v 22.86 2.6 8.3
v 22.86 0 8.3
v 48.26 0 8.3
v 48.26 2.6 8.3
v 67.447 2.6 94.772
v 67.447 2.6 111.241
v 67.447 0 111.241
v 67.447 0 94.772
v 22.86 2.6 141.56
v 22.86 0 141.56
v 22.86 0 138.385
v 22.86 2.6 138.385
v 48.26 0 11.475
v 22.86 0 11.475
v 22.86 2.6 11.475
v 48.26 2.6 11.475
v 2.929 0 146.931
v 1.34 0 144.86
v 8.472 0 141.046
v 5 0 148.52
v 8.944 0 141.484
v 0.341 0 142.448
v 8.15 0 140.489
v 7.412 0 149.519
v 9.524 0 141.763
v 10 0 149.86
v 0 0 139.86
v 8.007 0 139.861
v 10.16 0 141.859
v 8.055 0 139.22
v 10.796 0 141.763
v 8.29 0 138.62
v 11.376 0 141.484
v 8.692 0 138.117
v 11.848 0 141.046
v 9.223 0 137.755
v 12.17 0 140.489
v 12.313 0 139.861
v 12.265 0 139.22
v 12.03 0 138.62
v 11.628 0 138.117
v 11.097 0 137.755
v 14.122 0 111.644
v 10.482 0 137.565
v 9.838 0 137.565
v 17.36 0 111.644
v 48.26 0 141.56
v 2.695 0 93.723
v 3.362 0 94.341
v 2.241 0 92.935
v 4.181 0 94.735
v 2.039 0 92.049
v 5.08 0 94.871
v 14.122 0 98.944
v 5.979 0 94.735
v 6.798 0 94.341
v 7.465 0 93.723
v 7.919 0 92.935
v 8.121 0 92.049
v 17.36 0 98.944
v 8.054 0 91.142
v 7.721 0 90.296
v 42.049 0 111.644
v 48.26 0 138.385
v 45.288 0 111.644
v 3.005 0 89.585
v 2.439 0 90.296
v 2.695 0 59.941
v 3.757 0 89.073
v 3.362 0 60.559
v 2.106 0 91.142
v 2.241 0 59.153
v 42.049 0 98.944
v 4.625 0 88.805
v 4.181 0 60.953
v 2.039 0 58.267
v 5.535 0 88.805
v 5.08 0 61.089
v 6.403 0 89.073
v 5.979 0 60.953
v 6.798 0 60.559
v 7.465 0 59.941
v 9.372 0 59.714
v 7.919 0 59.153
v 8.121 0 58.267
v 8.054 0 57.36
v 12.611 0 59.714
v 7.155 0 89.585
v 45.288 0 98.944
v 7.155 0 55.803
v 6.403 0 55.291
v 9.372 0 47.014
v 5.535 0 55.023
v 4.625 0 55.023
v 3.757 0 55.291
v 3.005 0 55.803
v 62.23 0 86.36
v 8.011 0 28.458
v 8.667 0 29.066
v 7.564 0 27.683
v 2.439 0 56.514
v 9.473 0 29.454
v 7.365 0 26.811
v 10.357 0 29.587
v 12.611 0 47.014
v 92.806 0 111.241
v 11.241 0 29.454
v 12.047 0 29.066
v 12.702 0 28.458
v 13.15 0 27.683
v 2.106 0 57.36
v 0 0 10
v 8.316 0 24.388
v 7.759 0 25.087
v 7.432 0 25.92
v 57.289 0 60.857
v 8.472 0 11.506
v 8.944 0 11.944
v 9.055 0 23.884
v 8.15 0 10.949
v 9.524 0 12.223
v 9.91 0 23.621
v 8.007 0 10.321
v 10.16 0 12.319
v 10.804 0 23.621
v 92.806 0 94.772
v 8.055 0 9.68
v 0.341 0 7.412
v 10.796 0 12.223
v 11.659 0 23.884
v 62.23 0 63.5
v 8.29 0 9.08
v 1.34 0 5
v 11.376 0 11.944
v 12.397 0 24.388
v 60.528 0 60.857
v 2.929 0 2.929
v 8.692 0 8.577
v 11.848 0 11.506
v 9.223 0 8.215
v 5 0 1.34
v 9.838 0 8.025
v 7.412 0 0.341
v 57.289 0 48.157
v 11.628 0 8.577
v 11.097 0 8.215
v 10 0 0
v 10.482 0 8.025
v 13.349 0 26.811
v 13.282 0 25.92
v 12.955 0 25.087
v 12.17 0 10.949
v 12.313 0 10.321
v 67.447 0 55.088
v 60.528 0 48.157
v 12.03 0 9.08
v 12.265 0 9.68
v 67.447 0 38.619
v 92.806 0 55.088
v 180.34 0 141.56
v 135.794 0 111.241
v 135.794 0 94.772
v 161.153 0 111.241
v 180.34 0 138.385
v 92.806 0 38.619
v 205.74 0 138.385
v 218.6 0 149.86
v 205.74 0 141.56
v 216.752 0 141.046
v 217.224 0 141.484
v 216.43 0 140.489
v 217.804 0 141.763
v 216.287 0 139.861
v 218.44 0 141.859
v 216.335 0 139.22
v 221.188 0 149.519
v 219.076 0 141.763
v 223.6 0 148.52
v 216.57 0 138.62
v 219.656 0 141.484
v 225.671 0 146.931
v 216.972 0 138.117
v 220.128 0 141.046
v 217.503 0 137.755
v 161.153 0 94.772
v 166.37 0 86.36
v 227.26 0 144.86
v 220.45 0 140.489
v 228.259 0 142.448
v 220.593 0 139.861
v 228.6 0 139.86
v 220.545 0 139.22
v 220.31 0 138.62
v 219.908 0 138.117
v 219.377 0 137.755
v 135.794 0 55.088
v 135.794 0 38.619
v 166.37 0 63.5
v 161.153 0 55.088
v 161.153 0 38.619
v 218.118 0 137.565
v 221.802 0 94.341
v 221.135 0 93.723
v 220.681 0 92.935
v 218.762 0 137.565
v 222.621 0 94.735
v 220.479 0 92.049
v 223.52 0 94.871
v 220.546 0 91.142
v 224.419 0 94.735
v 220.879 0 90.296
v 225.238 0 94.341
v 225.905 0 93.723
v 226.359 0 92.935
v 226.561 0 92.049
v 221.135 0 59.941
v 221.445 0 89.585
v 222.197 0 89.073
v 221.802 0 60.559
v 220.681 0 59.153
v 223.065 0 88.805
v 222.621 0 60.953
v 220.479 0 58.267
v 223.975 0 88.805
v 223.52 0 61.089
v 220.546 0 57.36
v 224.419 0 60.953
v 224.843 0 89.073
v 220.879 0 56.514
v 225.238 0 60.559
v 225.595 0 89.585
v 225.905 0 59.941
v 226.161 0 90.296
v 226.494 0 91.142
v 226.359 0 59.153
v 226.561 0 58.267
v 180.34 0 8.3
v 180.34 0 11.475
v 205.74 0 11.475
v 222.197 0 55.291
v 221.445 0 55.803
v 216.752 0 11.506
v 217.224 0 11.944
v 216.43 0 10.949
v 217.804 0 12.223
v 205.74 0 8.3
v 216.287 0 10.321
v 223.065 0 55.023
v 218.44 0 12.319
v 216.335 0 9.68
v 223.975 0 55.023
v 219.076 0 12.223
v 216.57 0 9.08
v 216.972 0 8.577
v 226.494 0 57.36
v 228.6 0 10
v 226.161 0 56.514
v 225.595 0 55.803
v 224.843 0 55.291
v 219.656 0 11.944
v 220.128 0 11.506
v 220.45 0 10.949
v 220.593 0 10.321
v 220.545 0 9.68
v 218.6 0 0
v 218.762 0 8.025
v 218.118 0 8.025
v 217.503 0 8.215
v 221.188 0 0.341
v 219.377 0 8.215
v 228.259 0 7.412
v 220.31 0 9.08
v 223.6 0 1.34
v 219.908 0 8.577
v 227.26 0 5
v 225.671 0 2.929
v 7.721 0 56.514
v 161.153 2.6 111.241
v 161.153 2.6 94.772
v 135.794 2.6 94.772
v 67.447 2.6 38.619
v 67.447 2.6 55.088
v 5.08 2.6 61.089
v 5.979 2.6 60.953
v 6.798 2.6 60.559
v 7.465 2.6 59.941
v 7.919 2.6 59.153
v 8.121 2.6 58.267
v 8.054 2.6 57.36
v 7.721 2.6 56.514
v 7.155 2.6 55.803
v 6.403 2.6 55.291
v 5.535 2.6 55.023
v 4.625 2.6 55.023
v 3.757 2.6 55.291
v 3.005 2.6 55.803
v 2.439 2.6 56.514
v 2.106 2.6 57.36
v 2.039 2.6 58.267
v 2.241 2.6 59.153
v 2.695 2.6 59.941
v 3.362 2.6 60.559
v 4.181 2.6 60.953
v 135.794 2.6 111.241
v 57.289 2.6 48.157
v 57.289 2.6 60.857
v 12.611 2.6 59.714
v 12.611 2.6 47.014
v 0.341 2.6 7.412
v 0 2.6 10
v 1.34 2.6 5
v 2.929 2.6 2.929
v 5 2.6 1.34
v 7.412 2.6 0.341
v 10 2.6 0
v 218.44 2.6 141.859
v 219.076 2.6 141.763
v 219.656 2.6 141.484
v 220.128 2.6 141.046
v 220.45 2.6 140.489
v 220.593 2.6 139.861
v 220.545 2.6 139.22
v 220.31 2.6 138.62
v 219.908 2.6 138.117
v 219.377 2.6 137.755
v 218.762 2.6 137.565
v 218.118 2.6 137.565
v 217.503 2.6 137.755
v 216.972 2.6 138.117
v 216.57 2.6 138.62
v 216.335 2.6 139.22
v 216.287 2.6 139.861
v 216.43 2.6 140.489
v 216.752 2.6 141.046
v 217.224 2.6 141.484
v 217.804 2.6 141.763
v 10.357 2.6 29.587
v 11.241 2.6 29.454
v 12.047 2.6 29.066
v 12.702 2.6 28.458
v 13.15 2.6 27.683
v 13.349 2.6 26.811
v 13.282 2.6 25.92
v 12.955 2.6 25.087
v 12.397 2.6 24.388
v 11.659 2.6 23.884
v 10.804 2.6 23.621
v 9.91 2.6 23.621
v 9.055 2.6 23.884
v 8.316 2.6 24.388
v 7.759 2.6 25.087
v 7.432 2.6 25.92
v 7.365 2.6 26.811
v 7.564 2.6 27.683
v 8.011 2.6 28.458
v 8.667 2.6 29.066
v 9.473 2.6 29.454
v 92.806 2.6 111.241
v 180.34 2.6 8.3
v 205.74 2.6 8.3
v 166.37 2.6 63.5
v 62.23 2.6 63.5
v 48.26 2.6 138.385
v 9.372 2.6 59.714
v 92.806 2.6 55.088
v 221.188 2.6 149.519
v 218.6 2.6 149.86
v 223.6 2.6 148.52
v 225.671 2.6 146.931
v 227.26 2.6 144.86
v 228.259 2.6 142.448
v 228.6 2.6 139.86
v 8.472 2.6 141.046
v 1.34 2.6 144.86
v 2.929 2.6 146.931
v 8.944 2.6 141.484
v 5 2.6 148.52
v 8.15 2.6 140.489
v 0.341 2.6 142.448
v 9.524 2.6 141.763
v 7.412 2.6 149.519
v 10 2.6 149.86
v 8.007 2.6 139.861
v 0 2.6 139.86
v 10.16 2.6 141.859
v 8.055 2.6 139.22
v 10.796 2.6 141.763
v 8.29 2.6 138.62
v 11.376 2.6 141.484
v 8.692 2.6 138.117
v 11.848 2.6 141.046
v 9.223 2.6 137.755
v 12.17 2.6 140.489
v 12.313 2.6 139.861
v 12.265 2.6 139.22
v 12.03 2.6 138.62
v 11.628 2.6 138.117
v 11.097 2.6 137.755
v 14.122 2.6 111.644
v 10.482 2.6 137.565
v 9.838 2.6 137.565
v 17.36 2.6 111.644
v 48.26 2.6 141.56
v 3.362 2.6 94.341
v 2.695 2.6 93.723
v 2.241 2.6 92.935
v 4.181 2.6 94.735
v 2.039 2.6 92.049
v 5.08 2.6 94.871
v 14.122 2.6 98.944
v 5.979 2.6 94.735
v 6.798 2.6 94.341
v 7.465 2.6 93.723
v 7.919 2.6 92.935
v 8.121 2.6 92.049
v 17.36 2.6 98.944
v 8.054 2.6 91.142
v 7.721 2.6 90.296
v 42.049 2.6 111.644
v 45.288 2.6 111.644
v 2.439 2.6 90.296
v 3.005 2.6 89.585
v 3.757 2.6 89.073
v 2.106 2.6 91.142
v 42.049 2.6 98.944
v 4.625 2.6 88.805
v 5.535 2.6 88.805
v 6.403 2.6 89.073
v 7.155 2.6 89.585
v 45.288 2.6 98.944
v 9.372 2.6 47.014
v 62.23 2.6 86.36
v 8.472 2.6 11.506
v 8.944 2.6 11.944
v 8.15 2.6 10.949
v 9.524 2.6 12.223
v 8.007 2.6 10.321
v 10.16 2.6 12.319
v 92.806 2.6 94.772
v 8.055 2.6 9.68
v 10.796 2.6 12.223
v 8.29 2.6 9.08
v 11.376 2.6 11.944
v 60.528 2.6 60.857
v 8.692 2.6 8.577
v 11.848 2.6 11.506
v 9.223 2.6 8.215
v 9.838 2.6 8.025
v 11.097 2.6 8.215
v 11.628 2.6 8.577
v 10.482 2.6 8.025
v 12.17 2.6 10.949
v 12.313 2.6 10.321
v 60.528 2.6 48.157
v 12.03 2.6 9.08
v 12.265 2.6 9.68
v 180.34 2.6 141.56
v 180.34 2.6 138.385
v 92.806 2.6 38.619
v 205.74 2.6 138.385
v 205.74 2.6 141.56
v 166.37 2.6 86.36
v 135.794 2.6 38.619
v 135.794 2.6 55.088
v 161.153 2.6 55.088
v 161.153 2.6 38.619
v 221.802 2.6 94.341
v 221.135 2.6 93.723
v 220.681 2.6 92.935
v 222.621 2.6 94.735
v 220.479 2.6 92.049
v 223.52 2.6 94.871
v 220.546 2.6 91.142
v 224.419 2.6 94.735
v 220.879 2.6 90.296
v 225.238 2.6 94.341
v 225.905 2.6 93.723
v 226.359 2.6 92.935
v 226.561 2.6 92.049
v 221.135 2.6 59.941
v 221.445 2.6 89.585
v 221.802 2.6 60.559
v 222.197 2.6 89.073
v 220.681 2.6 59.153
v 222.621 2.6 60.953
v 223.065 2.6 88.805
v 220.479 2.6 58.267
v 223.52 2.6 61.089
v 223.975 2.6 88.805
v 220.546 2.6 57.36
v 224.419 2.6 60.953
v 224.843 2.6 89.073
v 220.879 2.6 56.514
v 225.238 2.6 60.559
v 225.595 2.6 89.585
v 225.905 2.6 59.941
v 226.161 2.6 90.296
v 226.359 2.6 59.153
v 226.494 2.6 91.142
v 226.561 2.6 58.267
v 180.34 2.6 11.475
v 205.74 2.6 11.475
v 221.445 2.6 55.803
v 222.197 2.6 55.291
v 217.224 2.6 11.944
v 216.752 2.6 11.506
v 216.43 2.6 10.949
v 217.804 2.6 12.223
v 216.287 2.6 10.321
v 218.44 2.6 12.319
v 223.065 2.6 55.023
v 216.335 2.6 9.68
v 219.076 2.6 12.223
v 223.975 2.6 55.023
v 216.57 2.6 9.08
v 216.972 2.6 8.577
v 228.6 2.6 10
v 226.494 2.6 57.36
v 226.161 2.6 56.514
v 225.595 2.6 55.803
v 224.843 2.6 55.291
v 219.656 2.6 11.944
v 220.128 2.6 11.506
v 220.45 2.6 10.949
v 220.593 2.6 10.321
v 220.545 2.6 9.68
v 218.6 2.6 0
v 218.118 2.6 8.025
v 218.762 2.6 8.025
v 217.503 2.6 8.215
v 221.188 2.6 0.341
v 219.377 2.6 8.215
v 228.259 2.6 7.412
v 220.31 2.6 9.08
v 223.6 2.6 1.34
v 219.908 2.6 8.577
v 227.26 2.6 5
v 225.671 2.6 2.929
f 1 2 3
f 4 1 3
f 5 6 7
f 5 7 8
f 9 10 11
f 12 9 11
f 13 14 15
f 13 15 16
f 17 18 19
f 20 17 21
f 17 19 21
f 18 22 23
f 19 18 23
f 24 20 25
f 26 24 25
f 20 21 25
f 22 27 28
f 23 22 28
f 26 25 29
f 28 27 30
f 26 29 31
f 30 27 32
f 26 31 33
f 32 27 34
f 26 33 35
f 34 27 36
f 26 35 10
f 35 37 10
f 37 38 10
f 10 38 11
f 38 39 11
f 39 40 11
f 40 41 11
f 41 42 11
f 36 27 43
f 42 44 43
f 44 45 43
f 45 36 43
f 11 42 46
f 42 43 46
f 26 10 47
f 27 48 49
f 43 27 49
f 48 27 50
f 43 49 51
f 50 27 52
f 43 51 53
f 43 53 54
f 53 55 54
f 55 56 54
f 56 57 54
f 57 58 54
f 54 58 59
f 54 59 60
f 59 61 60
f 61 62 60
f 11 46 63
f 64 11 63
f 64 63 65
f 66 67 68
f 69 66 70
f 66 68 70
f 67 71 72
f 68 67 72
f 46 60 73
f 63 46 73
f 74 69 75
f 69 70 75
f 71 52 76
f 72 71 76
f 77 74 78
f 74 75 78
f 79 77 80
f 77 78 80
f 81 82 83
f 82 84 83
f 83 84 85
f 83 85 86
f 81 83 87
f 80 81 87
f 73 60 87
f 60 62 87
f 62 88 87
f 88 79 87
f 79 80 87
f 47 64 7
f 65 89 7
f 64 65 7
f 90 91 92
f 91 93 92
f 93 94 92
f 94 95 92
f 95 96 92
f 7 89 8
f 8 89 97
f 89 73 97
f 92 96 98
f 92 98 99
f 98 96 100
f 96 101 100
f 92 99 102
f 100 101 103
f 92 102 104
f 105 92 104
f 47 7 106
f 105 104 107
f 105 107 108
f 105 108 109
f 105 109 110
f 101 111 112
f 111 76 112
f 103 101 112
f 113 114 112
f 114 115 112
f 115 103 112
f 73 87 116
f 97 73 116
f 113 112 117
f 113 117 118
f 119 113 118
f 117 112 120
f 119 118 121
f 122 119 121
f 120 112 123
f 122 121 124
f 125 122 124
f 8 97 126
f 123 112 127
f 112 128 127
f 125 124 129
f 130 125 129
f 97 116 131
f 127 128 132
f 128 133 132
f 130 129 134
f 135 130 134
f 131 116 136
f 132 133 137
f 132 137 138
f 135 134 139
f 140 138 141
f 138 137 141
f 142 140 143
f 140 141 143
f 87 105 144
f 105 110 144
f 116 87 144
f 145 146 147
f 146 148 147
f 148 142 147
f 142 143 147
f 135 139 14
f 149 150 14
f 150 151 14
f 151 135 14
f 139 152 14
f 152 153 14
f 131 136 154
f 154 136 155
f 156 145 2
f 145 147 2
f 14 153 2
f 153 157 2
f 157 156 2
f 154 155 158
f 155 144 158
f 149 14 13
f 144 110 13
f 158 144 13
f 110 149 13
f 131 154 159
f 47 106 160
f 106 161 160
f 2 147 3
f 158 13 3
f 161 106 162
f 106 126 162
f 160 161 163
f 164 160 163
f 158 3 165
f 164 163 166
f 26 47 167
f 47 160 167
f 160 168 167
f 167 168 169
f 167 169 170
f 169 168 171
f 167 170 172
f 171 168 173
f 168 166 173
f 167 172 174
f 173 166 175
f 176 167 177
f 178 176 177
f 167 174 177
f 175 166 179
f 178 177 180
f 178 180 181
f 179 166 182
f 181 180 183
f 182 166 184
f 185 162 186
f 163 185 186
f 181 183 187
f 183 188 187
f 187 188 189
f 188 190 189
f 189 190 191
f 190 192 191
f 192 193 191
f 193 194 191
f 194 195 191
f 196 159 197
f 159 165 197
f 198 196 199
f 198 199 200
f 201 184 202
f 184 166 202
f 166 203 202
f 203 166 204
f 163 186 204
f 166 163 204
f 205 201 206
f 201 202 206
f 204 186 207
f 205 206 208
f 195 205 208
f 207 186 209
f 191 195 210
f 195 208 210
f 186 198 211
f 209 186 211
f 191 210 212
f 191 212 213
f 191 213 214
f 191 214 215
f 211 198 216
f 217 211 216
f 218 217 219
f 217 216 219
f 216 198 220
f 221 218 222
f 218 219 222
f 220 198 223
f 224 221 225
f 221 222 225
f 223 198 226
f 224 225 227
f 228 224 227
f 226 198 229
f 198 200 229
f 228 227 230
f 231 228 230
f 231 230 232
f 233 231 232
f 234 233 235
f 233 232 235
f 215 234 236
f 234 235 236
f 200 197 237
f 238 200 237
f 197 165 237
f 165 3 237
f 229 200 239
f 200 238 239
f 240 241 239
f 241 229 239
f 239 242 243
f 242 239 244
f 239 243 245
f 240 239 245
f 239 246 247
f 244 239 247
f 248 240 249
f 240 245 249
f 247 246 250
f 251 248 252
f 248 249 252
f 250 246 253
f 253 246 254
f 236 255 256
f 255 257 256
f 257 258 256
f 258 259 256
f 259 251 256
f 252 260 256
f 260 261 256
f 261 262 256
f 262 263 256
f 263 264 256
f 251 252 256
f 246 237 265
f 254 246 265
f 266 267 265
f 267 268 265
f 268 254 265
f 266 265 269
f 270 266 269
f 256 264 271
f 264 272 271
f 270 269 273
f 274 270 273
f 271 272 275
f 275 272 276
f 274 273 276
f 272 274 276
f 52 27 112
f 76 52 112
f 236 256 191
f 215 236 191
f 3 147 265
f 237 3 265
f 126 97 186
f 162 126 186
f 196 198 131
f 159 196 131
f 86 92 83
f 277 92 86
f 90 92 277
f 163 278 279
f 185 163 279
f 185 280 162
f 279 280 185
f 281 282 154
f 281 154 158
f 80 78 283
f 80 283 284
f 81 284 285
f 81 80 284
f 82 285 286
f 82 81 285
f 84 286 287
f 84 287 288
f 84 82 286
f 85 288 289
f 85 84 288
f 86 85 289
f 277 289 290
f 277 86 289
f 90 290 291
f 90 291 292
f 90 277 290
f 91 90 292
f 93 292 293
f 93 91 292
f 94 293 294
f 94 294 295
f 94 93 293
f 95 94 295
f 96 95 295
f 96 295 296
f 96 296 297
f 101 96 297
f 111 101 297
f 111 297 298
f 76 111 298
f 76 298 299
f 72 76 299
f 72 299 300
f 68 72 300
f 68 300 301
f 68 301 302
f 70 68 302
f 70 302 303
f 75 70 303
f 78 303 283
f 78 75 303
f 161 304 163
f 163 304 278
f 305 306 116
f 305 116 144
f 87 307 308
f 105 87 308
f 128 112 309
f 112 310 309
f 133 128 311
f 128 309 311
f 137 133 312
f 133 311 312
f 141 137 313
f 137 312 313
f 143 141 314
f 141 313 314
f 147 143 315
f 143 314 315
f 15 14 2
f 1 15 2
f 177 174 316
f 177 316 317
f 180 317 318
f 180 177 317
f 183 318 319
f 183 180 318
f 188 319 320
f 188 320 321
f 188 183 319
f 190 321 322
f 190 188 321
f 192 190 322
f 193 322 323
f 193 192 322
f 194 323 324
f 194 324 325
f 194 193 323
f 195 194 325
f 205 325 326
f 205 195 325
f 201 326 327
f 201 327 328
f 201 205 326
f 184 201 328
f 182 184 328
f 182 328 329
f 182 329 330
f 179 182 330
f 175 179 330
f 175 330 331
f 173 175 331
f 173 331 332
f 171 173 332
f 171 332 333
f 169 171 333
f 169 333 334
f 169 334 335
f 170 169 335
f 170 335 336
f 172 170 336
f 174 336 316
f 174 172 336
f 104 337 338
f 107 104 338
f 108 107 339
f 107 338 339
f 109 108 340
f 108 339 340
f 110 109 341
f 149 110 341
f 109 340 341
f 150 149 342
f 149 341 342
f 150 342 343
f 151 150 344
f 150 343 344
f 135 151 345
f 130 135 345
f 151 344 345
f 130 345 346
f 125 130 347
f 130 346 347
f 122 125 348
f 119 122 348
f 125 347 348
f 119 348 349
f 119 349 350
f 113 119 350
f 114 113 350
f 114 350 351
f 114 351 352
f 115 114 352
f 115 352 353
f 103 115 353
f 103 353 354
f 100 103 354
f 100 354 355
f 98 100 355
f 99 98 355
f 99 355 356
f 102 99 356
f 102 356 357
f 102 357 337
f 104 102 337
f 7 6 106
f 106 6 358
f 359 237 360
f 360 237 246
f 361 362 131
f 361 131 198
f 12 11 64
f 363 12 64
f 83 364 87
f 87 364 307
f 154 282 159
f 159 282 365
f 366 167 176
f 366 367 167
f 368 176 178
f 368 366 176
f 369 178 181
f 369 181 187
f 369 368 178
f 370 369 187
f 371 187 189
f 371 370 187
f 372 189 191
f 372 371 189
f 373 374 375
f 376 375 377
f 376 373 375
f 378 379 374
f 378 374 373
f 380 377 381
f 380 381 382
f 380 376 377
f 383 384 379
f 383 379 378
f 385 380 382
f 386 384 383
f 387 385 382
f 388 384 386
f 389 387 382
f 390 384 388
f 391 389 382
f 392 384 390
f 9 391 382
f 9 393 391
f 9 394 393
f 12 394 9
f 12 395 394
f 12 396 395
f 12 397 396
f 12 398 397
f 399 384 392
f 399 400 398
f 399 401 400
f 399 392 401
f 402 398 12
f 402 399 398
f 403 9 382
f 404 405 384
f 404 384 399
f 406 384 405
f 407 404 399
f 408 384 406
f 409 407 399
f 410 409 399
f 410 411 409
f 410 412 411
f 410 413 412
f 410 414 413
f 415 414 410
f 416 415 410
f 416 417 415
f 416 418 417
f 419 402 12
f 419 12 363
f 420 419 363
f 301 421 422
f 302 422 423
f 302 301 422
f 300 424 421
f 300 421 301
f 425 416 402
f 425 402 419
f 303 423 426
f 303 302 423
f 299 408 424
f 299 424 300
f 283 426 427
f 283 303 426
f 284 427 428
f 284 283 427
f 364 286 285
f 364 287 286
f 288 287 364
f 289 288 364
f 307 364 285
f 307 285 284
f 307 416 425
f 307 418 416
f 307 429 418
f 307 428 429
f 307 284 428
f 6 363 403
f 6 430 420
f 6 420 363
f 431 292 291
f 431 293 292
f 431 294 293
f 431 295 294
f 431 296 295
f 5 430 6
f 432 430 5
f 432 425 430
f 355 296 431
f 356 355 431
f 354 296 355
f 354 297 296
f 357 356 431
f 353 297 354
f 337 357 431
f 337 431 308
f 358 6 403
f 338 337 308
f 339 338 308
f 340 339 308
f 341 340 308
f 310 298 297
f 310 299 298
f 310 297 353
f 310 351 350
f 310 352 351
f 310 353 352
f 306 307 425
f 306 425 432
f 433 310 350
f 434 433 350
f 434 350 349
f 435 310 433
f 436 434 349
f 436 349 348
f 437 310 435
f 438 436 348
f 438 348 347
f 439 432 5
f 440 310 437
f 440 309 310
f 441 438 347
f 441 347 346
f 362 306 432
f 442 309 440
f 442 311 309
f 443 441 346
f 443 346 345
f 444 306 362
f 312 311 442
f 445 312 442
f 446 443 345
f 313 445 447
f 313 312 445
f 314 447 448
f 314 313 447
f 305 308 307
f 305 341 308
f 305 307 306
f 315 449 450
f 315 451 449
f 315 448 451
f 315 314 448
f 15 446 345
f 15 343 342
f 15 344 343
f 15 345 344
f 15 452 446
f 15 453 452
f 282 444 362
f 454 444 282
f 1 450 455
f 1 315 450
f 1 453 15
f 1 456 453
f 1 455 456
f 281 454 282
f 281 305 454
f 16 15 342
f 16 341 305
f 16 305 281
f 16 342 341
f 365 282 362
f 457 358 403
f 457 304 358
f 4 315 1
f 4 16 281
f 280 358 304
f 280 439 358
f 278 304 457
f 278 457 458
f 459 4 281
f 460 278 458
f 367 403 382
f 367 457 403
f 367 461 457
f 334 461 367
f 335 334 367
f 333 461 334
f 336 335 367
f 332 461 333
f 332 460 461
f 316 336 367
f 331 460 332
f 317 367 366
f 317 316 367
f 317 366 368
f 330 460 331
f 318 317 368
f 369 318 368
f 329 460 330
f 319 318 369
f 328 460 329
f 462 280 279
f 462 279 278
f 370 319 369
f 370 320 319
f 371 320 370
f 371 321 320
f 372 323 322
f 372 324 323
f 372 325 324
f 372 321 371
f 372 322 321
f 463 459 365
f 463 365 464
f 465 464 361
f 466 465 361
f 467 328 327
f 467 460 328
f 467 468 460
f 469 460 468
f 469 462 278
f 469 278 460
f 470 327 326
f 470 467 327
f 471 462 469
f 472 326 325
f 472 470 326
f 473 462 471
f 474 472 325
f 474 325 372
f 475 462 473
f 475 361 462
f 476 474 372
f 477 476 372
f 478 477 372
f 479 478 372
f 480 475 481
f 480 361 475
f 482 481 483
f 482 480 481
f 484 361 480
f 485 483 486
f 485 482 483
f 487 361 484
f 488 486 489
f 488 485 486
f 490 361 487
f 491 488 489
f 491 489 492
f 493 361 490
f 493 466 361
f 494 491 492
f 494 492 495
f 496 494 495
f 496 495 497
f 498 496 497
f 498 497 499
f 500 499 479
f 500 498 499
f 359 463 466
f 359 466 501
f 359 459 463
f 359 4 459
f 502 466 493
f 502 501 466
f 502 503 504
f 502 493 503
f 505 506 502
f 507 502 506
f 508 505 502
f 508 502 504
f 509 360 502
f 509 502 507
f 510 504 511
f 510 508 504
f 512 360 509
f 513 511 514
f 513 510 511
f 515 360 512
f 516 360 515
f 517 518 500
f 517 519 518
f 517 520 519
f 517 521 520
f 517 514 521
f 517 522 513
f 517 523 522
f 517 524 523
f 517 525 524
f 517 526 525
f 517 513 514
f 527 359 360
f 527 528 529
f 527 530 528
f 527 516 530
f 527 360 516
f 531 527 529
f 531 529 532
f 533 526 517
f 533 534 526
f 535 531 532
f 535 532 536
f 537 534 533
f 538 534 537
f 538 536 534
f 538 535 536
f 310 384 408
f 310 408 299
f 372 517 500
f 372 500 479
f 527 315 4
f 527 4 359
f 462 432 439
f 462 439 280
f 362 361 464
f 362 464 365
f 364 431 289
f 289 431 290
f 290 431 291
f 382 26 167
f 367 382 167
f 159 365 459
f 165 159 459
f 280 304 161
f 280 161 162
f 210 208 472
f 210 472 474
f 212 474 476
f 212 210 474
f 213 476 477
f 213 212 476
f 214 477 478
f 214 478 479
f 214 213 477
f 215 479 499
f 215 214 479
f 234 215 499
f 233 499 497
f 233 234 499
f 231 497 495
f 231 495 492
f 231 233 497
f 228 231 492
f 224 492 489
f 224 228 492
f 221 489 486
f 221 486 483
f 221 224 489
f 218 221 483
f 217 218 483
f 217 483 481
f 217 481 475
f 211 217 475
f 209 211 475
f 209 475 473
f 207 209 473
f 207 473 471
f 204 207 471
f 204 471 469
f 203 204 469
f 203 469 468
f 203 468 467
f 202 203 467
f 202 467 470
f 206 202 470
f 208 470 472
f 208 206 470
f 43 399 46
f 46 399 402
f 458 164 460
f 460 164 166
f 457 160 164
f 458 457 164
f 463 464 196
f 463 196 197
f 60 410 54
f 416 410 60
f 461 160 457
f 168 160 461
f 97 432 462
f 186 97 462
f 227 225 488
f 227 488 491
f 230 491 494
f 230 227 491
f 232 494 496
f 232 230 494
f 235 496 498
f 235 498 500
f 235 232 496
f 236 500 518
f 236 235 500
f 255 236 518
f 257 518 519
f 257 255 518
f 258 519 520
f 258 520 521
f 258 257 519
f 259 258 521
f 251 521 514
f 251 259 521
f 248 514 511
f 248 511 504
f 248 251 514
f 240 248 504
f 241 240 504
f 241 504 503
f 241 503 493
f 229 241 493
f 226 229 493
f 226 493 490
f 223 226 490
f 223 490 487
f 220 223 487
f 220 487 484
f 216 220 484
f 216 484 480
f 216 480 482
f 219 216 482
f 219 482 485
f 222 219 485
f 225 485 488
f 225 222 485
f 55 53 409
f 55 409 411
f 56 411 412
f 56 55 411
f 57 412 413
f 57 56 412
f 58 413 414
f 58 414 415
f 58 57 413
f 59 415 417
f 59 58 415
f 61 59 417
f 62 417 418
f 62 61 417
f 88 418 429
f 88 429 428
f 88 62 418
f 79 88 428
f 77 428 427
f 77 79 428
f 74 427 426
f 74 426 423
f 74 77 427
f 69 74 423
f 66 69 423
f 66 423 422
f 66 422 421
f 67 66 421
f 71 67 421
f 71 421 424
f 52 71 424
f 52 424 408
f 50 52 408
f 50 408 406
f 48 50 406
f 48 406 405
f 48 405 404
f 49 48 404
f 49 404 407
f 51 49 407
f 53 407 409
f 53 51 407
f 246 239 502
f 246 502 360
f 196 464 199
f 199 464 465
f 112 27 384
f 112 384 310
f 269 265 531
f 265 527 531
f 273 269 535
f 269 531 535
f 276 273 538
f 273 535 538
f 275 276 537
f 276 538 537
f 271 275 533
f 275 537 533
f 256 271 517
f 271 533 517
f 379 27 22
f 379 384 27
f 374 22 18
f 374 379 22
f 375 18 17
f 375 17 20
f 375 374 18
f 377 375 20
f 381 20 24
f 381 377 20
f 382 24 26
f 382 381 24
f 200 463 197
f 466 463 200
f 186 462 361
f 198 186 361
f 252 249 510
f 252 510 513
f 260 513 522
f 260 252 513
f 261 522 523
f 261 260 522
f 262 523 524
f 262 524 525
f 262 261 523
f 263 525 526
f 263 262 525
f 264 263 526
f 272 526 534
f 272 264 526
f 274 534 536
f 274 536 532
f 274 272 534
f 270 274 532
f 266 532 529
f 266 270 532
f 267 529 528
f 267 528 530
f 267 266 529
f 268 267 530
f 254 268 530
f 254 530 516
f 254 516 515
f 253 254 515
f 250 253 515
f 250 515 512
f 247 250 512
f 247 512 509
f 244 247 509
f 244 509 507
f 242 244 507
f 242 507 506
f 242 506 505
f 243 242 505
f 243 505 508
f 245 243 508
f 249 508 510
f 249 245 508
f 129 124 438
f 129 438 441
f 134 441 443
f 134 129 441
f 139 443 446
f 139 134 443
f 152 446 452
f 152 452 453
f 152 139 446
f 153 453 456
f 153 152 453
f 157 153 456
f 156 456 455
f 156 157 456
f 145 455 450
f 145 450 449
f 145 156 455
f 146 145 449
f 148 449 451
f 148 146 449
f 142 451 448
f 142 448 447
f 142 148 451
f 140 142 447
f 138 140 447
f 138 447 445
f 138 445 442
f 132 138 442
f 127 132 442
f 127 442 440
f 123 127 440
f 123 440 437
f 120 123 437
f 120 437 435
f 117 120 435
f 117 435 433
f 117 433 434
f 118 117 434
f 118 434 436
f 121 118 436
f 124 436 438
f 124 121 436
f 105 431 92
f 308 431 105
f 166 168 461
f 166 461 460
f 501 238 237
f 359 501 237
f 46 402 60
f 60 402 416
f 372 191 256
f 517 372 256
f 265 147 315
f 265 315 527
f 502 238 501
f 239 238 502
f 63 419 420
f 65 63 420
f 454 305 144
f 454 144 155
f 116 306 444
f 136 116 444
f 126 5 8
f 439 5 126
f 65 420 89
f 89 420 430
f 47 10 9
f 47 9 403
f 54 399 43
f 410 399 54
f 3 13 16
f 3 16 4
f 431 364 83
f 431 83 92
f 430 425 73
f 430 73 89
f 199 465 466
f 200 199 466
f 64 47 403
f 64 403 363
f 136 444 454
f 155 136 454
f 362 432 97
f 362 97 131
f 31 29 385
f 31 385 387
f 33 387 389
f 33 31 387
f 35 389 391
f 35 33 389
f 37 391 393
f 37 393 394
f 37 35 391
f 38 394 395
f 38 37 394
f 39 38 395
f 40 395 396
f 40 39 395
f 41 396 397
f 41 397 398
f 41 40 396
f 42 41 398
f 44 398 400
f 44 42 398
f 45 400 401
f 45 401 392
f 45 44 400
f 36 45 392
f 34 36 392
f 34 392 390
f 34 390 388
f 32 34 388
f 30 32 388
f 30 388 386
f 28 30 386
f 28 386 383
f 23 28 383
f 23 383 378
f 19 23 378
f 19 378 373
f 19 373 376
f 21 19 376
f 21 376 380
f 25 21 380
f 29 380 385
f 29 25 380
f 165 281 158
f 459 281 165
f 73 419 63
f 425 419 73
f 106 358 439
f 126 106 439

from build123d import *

# Parameters (mm, degrees)
SKETCH1_W           = 228.6
SKETCH1_H           = 149.86
SKETCH1_R           = 3.05
SKETCH1_R_2         = 2.159
SKETCH1_W_2         = 25.4
SKETCH1_H_2         = 3.175
BOSS_EXTRUDE1_DEPTH = 2.6
FILLET1_R           = 10
SKETCH25_W          = 104.14
SKETCH25_H          = 22.86
SKETCH25_W_2        = 3.2385
SKETCH25_H_2        = 12.7
CUT_EXTRUDE18_DEPTH = 10.16
SKETCH26_W          = 25.35893358
SKETCH26_H          = 16.469313419
CUT_EXTRUDE19_DEPTH = 7.62
SKETCH27_R          = 3
CUT_EXTRUDE20_DEPTH = 7.62


with BuildPart() as part:
    # Sketch1 → Boss-Extrude1 (new body)
    with BuildSketch(Plane(origin=(0, 0, 0), x_dir=(1, 0, 0), z_dir=(0, 1, 0))):
        with Locations((114.3, -74.93)):
            Rectangle(SKETCH1_W, SKETCH1_H)
        with Locations(Location((5.08, -58.039, 0), (0, 0, 270))):
            Circle(SKETCH1_R, mode=Mode.SUBTRACT)
        with Locations(Location((5.08, -91.821, 0), (0, 0, 270))):
            Circle(SKETCH1_R, mode=Mode.SUBTRACT)
        with Locations(Location((223.52, -91.821, 0), (0, 0, 270))):
            Circle(SKETCH1_R, mode=Mode.SUBTRACT)
        with Locations(Location((223.52, -58.039, 0), (0, 0, 270))):
            Circle(SKETCH1_R, mode=Mode.SUBTRACT)
        with Locations(Location((218.44, -10.16, 0), (0, 0, 270))):
            Circle(SKETCH1_R_2, mode=Mode.SUBTRACT)
        with Locations(Location((10.16, -10.16, 0), (0, 0, 270))):
            Circle(SKETCH1_R_2, mode=Mode.SUBTRACT)
        with Locations(Location((218.44, -139.7, 0), (0, 0, 270))):
            Circle(SKETCH1_R_2, mode=Mode.SUBTRACT)
        with Locations(Location((10.16, -139.7, 0), (0, 0, 270))):
            Circle(SKETCH1_R_2, mode=Mode.SUBTRACT)
        with Locations((35.56, -9.887961988)):
            Rectangle(SKETCH1_W_2, SKETCH1_H_2, mode=Mode.SUBTRACT)
        with Locations((193.04, -9.887961988)):
            Rectangle(SKETCH1_W_2, SKETCH1_H_2, mode=Mode.SUBTRACT)
        with Locations((193.04, -139.972038012)):
            Rectangle(SKETCH1_W_2, SKETCH1_H_2, mode=Mode.SUBTRACT)
        with Locations((35.56, -139.972038012)):
            Rectangle(SKETCH1_W_2, SKETCH1_H_2, mode=Mode.SUBTRACT)
    extrude(amount=BOSS_EXTRUDE1_DEPTH)

    # Fillet1
    fillet1_edges = [part.edges().sort_by_distance(p)[0] for p in [
        (0, 1.3, 0),
        (228.6, 1.3, 0),
        (228.6, 1.3, 149.86),
        (0, 1.3, 149.86),
    ]]
    fillet(fillet1_edges, radius=FILLET1_R)

    # Sketch25 → Cut-Extrude18 (cut)
    with BuildSketch(Plane(origin=(0, 2.6, 0), x_dir=(1, 0, 0), z_dir=(0, 1, 0))):
        with Locations((114.3, -74.93)):
            Rectangle(SKETCH25_W, SKETCH25_H)
        with Locations((10.991446919, -53.364023976)):
            Rectangle(SKETCH25_W_2, SKETCH25_H_2)
        with Locations((58.908546919, -54.507023976)):
            Rectangle(SKETCH25_W_2, SKETCH25_H_2)
        with Locations((15.741246919, -105.294323976)):
            Rectangle(SKETCH25_W_2, SKETCH25_H_2)
        with Locations((43.668546919, -105.294323976)):
            Rectangle(SKETCH25_W_2, SKETCH25_H_2)
    extrude(amount=-CUT_EXTRUDE18_DEPTH, mode=Mode.SUBTRACT)

    # Sketch26 → Cut-Extrude19 (cut)
    with BuildSketch(Plane(origin=(0, 2.6, 0), x_dir=(1, 0, 0), z_dir=(0, 1, 0))):
        with Locations((80.126817751, -46.853769114)):
            Rectangle(SKETCH26_W, SKETCH26_H)
        with Locations((80.126817751, -103.006230887)):
            Rectangle(SKETCH26_W, SKETCH26_H)
        with Locations((148.473182249, -103.006230887)):
            Rectangle(SKETCH26_W, SKETCH26_H)
        with Locations((148.473182249, -46.853769114)):
            Rectangle(SKETCH26_W, SKETCH26_H)
    extrude(amount=-CUT_EXTRUDE19_DEPTH, mode=Mode.SUBTRACT)

    # Sketch27 → Cut-Extrude20 (cut)
    with BuildSketch(Plane(origin=(0, 2.6, 0), x_dir=(1, 0, 0), z_dir=(0, 1, 0))):
        with Locations(Location((10.356901739, -26.58723359, 0), (0, 0, 270))):
            Circle(SKETCH27_R)
    extrude(amount=-CUT_EXTRUDE20_DEPTH, mode=Mode.SUBTRACT)


solid = part.part
